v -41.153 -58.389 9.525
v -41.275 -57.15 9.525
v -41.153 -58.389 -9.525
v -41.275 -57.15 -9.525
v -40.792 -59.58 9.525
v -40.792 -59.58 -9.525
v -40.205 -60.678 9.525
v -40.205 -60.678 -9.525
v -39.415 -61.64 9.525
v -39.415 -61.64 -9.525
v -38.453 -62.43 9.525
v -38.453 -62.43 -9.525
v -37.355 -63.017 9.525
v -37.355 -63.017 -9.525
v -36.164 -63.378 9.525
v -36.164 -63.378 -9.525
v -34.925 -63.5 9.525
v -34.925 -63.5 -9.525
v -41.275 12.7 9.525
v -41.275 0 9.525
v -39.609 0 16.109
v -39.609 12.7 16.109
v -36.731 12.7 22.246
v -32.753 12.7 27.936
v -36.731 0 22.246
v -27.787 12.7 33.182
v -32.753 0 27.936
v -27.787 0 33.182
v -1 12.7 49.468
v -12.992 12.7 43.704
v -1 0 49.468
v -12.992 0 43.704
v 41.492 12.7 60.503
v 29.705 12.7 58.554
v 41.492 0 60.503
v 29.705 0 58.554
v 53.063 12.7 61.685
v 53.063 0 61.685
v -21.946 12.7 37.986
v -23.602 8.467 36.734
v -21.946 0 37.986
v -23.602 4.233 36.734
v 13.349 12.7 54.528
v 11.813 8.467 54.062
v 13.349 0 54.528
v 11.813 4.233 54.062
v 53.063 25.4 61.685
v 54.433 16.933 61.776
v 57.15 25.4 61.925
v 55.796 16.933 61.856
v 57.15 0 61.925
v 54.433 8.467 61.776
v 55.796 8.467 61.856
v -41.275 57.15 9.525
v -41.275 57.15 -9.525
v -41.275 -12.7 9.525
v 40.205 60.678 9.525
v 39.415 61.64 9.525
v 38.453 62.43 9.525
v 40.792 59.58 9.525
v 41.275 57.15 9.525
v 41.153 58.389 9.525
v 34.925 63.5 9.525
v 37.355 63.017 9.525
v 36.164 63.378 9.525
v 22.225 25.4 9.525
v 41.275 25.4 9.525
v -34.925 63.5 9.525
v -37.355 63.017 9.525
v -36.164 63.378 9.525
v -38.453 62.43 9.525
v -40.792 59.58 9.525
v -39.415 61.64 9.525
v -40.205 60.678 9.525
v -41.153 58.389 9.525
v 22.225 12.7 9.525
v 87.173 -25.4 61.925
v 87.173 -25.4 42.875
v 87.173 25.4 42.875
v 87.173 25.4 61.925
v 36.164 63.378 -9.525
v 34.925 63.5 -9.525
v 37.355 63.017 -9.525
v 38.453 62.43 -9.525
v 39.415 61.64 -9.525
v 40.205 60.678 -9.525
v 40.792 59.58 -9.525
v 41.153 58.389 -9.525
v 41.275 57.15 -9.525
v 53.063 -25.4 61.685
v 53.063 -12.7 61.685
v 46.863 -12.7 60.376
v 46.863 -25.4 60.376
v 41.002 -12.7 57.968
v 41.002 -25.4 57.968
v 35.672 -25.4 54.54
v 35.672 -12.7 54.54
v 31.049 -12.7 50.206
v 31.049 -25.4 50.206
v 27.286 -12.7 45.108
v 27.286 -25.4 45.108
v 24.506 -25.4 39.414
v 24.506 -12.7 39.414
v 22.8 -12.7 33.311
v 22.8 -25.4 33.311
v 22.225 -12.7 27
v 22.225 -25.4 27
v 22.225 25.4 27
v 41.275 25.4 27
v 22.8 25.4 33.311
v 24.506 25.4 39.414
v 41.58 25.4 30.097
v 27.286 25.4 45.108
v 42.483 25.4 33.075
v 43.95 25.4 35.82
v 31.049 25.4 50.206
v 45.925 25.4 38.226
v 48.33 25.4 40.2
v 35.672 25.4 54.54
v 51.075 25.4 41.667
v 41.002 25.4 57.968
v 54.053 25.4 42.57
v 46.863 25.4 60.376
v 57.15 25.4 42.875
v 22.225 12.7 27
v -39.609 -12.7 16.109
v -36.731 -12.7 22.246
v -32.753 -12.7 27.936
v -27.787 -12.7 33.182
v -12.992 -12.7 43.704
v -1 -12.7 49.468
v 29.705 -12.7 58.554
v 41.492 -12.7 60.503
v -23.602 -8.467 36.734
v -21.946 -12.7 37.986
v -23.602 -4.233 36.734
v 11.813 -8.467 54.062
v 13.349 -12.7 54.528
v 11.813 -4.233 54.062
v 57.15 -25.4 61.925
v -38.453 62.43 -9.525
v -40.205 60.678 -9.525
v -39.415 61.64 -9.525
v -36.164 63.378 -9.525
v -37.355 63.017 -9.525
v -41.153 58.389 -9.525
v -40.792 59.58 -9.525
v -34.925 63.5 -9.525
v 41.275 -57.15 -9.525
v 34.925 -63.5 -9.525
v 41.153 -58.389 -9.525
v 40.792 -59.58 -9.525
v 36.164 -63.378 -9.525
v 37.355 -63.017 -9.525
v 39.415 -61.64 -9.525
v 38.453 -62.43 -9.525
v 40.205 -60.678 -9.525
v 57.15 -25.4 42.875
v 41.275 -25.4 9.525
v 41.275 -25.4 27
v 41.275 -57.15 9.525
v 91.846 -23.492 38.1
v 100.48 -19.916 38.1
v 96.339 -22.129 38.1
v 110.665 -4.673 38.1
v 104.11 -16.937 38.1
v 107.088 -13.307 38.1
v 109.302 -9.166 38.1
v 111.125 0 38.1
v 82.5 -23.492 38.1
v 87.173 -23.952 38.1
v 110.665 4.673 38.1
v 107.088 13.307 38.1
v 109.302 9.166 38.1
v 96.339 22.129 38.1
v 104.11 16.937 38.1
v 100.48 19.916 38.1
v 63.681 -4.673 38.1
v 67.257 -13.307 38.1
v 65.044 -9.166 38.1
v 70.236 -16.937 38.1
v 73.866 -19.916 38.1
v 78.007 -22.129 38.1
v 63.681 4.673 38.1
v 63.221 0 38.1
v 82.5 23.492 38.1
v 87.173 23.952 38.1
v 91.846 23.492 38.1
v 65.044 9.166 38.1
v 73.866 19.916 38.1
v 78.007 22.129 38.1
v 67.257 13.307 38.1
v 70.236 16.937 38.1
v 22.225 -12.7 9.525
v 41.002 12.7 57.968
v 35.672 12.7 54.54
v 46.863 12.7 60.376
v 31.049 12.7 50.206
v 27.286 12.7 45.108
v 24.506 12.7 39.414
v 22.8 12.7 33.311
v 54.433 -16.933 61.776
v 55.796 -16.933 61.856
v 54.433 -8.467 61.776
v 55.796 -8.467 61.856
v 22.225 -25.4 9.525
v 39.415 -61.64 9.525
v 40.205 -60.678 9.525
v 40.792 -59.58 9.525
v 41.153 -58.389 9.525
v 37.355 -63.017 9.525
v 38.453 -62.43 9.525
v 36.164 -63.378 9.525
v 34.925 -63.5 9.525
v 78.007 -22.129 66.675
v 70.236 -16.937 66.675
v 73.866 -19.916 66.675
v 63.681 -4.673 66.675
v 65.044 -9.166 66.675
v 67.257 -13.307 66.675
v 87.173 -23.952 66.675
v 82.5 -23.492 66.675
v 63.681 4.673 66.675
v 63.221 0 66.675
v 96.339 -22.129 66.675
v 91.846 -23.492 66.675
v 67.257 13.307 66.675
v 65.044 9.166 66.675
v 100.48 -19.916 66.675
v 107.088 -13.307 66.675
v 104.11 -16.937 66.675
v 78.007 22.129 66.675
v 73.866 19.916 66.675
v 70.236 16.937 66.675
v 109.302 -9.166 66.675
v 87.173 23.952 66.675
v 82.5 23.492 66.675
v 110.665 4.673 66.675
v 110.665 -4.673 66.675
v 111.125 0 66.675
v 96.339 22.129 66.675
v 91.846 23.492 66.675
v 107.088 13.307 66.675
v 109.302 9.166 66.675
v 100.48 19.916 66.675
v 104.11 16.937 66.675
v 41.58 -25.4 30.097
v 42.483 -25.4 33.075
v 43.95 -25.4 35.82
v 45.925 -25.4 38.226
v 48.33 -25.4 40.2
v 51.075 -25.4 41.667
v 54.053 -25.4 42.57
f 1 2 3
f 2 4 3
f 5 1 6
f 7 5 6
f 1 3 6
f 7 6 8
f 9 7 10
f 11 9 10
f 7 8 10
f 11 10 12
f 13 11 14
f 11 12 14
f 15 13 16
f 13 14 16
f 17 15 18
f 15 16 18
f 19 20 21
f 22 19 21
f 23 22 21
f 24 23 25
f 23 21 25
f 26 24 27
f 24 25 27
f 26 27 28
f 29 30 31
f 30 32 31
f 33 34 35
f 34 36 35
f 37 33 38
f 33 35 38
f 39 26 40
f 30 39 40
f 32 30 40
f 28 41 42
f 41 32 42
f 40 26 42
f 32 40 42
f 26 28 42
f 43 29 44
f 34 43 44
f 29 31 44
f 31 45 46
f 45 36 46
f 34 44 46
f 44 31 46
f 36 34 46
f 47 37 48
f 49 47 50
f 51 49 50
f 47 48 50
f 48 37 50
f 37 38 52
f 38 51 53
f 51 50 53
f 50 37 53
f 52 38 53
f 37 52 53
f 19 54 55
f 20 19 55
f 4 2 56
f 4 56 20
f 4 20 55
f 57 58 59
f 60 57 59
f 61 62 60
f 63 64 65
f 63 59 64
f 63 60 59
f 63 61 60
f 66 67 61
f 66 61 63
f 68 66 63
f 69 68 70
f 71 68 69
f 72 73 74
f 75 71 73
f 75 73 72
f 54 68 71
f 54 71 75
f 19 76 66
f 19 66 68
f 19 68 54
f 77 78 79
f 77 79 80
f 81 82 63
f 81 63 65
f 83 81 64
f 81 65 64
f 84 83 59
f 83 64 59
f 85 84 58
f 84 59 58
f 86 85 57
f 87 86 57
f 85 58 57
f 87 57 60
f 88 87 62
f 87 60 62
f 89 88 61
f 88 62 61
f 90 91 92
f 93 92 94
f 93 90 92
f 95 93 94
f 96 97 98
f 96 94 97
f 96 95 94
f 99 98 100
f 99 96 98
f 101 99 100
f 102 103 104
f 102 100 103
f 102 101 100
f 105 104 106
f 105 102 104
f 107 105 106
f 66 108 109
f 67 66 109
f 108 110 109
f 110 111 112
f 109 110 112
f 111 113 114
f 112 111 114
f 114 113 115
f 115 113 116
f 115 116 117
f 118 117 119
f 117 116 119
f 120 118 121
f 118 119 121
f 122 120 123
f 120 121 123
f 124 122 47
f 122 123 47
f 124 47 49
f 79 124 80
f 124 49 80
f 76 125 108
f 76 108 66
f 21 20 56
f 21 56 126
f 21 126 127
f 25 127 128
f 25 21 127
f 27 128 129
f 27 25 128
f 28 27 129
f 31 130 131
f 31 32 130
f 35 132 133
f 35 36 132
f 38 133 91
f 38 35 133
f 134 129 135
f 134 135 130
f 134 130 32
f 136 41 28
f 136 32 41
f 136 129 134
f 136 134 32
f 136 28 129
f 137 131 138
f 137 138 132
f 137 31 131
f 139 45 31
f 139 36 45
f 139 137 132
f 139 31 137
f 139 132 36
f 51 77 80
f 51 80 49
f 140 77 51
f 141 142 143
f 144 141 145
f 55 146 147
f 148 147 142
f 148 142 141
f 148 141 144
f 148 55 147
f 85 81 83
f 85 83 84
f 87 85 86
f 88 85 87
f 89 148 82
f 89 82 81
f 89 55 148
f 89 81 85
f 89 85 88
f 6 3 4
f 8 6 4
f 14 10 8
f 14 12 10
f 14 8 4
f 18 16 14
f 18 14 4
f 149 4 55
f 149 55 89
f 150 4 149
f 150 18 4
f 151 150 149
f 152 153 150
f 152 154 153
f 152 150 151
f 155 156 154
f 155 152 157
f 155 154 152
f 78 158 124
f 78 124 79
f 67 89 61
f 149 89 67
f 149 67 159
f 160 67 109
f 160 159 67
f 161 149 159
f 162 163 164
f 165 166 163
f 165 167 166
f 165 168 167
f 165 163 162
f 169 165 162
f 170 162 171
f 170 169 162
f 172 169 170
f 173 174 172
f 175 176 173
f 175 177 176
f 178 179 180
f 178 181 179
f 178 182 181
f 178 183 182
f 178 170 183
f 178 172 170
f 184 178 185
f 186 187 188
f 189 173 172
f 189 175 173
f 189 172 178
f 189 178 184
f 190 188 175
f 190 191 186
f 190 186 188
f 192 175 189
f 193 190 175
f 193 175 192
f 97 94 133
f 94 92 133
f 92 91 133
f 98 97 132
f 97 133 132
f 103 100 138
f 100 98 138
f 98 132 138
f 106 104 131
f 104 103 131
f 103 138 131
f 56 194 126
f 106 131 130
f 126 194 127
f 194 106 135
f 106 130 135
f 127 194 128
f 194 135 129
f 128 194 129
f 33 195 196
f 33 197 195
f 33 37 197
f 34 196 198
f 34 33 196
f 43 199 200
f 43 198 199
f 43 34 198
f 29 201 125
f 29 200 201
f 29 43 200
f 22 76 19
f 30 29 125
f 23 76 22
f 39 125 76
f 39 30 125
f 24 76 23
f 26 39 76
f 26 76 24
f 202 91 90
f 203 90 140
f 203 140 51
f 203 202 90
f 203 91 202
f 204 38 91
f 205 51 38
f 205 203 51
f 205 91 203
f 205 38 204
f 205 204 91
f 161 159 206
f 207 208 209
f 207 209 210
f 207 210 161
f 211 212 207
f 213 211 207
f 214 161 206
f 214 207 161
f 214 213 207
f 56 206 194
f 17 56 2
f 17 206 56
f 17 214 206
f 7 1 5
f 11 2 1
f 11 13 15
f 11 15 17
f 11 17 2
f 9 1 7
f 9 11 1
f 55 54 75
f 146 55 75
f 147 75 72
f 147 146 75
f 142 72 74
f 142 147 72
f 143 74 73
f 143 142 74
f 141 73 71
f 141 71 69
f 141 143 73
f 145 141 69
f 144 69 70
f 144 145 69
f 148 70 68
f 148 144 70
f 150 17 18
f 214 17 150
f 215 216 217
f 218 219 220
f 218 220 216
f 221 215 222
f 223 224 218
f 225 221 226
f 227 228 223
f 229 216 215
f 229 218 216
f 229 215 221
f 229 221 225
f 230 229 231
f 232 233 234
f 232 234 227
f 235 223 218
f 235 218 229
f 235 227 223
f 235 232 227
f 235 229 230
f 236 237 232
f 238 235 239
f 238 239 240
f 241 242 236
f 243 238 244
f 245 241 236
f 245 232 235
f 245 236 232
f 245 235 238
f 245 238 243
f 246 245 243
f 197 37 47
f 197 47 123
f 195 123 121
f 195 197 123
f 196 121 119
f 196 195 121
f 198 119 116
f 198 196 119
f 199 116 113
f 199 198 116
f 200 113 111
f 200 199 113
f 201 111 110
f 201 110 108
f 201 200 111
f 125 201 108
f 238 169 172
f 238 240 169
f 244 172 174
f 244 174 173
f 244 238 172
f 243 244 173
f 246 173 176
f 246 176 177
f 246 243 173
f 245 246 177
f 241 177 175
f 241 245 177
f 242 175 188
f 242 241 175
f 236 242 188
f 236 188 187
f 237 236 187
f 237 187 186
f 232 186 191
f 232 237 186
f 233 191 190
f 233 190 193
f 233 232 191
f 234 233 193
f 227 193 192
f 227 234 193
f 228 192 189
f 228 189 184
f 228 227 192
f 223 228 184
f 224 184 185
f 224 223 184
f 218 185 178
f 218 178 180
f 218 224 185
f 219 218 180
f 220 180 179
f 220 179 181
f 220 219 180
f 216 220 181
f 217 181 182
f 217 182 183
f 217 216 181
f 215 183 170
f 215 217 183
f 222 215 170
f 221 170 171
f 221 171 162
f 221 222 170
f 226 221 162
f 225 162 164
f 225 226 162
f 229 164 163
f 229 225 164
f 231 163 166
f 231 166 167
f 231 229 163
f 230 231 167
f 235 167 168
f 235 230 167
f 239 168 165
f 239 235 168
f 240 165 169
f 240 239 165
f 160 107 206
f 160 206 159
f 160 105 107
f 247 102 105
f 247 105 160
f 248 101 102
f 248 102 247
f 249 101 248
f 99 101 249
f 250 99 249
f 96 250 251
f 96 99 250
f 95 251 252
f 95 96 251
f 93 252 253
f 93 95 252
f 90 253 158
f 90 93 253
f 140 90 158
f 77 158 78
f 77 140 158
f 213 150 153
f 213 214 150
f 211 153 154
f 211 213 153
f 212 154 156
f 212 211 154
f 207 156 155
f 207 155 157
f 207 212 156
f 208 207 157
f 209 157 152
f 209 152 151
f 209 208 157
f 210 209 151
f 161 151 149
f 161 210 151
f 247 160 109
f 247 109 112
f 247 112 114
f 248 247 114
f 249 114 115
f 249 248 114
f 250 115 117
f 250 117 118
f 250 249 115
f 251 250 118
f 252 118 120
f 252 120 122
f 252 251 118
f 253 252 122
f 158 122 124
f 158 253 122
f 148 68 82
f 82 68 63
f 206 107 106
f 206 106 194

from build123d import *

# Parameters (mm, degrees)
F1_DEPTH = 63.5
F0_W     = 26.8478
F0_H     = 19.05
F2_DEPTH = 25.4
F3_DEPTH = 12.7
F5_R     = 6.35


# Not quite as in the source:
# - a feature names something its author has since deleted; it is built from what else it names


with BuildPart() as f1:
    # F0 (on Front) → F1 (new body, symmetric)
    with BuildSketch(Plane.XZ):
        Polygon((22.225, 9.525), (-41.275, 9.525), (-41.275, -9.525), (41.275, -9.525), (41.275, 9.525), align=None)
    extrude(amount=F1_DEPTH, both=True)

    # F0 (on Front) → F2 (join, symmetric)
    with BuildSketch(Plane.XZ):
        with BuildLine():
            Line((22.225, 27.0002), (22.225, 9.525))
            Line((22.225, 9.525), (41.275, 9.525))
            Line((41.275, 9.525), (41.275, 27.0002))
            ThreePointArc((41.275, 27.0002), (45.9246798487, 38.2255201513), (57.15, 42.8752))
            Line((57.15, 42.8752), (60.325, 42.8752))
            Line((60.325, 42.8752), (60.325, 61.9252))
            Line((60.325, 61.9252), (57.15, 61.9252))
            add(Edge.make_bspline(
                [(53.0632119302, 61.6852657816), (54.436822126, 61.7819257772), (55.7997974291, 61.8618933869), (57.15, 61.9252)],
                knots=[107.8202324218, 107.8202324218, 107.8202324218, 107.8202324218, 111.5045361635, 111.5045361635, 111.5045361635, 111.5045361635], degree=3))
            ThreePointArc((53.0632119302, 61.6852657816), (31.0493611349, 50.2060672717), (22.225, 27.0002))
        make_face()
        with Locations((73.7489, 52.4002)):
            Rectangle(F0_W, F0_H)
    extrude(amount=F2_DEPTH, both=True)

    # F0 (on Front) → F3 (join, symmetric)
    with BuildSketch(Plane.XZ):
        with BuildLine():
            add(Edge.make_bspline(
                [(-41.275, 9.525), (-36.4415043335, 41.7320166895), (12.8648512777, 58.8565350576), (53.0632119302, 61.6852657816)],
                knots=[0, 0, 0, 0, 107.8202324218, 107.8202324218, 107.8202324218, 107.8202324218], degree=3))
            Line((-41.275, 9.525), (22.225, 9.525))
            Line((22.225, 9.525), (22.225, 27.0002))
            ThreePointArc((22.225, 27.0002), (31.0493611349, 50.2060672717), (53.0632119302, 61.6852657816))
        make_face()
    extrude(amount=F3_DEPTH, both=True)

    # F5
    f5_edges = [f1.edges().sort_by_distance(p)[0] for p in [
        (-41.275, -63.5, 0),
        (41.275, -63.5, 0),
        (41.275, 63.5, 0),
        (-41.275, 63.5, 0),
    ]]
    fillet(f5_edges, radius=F5_R)


with BuildPart() as f4:
    # F0 (on Front) → F4 (revolve)
    with BuildSketch(Plane.XZ):
        Polygon((87.1728, 66.675), (87.1728, 61.9252), (87.1728, 42.8752), (87.1728, 38.1), (111.125, 38.1), (111.125, 66.675), align=None)
    revolve(axis=Axis((87.1728, 0, 52.3875), (0, 0, 1)))


solid = Compound([f1.part, f4.part])
